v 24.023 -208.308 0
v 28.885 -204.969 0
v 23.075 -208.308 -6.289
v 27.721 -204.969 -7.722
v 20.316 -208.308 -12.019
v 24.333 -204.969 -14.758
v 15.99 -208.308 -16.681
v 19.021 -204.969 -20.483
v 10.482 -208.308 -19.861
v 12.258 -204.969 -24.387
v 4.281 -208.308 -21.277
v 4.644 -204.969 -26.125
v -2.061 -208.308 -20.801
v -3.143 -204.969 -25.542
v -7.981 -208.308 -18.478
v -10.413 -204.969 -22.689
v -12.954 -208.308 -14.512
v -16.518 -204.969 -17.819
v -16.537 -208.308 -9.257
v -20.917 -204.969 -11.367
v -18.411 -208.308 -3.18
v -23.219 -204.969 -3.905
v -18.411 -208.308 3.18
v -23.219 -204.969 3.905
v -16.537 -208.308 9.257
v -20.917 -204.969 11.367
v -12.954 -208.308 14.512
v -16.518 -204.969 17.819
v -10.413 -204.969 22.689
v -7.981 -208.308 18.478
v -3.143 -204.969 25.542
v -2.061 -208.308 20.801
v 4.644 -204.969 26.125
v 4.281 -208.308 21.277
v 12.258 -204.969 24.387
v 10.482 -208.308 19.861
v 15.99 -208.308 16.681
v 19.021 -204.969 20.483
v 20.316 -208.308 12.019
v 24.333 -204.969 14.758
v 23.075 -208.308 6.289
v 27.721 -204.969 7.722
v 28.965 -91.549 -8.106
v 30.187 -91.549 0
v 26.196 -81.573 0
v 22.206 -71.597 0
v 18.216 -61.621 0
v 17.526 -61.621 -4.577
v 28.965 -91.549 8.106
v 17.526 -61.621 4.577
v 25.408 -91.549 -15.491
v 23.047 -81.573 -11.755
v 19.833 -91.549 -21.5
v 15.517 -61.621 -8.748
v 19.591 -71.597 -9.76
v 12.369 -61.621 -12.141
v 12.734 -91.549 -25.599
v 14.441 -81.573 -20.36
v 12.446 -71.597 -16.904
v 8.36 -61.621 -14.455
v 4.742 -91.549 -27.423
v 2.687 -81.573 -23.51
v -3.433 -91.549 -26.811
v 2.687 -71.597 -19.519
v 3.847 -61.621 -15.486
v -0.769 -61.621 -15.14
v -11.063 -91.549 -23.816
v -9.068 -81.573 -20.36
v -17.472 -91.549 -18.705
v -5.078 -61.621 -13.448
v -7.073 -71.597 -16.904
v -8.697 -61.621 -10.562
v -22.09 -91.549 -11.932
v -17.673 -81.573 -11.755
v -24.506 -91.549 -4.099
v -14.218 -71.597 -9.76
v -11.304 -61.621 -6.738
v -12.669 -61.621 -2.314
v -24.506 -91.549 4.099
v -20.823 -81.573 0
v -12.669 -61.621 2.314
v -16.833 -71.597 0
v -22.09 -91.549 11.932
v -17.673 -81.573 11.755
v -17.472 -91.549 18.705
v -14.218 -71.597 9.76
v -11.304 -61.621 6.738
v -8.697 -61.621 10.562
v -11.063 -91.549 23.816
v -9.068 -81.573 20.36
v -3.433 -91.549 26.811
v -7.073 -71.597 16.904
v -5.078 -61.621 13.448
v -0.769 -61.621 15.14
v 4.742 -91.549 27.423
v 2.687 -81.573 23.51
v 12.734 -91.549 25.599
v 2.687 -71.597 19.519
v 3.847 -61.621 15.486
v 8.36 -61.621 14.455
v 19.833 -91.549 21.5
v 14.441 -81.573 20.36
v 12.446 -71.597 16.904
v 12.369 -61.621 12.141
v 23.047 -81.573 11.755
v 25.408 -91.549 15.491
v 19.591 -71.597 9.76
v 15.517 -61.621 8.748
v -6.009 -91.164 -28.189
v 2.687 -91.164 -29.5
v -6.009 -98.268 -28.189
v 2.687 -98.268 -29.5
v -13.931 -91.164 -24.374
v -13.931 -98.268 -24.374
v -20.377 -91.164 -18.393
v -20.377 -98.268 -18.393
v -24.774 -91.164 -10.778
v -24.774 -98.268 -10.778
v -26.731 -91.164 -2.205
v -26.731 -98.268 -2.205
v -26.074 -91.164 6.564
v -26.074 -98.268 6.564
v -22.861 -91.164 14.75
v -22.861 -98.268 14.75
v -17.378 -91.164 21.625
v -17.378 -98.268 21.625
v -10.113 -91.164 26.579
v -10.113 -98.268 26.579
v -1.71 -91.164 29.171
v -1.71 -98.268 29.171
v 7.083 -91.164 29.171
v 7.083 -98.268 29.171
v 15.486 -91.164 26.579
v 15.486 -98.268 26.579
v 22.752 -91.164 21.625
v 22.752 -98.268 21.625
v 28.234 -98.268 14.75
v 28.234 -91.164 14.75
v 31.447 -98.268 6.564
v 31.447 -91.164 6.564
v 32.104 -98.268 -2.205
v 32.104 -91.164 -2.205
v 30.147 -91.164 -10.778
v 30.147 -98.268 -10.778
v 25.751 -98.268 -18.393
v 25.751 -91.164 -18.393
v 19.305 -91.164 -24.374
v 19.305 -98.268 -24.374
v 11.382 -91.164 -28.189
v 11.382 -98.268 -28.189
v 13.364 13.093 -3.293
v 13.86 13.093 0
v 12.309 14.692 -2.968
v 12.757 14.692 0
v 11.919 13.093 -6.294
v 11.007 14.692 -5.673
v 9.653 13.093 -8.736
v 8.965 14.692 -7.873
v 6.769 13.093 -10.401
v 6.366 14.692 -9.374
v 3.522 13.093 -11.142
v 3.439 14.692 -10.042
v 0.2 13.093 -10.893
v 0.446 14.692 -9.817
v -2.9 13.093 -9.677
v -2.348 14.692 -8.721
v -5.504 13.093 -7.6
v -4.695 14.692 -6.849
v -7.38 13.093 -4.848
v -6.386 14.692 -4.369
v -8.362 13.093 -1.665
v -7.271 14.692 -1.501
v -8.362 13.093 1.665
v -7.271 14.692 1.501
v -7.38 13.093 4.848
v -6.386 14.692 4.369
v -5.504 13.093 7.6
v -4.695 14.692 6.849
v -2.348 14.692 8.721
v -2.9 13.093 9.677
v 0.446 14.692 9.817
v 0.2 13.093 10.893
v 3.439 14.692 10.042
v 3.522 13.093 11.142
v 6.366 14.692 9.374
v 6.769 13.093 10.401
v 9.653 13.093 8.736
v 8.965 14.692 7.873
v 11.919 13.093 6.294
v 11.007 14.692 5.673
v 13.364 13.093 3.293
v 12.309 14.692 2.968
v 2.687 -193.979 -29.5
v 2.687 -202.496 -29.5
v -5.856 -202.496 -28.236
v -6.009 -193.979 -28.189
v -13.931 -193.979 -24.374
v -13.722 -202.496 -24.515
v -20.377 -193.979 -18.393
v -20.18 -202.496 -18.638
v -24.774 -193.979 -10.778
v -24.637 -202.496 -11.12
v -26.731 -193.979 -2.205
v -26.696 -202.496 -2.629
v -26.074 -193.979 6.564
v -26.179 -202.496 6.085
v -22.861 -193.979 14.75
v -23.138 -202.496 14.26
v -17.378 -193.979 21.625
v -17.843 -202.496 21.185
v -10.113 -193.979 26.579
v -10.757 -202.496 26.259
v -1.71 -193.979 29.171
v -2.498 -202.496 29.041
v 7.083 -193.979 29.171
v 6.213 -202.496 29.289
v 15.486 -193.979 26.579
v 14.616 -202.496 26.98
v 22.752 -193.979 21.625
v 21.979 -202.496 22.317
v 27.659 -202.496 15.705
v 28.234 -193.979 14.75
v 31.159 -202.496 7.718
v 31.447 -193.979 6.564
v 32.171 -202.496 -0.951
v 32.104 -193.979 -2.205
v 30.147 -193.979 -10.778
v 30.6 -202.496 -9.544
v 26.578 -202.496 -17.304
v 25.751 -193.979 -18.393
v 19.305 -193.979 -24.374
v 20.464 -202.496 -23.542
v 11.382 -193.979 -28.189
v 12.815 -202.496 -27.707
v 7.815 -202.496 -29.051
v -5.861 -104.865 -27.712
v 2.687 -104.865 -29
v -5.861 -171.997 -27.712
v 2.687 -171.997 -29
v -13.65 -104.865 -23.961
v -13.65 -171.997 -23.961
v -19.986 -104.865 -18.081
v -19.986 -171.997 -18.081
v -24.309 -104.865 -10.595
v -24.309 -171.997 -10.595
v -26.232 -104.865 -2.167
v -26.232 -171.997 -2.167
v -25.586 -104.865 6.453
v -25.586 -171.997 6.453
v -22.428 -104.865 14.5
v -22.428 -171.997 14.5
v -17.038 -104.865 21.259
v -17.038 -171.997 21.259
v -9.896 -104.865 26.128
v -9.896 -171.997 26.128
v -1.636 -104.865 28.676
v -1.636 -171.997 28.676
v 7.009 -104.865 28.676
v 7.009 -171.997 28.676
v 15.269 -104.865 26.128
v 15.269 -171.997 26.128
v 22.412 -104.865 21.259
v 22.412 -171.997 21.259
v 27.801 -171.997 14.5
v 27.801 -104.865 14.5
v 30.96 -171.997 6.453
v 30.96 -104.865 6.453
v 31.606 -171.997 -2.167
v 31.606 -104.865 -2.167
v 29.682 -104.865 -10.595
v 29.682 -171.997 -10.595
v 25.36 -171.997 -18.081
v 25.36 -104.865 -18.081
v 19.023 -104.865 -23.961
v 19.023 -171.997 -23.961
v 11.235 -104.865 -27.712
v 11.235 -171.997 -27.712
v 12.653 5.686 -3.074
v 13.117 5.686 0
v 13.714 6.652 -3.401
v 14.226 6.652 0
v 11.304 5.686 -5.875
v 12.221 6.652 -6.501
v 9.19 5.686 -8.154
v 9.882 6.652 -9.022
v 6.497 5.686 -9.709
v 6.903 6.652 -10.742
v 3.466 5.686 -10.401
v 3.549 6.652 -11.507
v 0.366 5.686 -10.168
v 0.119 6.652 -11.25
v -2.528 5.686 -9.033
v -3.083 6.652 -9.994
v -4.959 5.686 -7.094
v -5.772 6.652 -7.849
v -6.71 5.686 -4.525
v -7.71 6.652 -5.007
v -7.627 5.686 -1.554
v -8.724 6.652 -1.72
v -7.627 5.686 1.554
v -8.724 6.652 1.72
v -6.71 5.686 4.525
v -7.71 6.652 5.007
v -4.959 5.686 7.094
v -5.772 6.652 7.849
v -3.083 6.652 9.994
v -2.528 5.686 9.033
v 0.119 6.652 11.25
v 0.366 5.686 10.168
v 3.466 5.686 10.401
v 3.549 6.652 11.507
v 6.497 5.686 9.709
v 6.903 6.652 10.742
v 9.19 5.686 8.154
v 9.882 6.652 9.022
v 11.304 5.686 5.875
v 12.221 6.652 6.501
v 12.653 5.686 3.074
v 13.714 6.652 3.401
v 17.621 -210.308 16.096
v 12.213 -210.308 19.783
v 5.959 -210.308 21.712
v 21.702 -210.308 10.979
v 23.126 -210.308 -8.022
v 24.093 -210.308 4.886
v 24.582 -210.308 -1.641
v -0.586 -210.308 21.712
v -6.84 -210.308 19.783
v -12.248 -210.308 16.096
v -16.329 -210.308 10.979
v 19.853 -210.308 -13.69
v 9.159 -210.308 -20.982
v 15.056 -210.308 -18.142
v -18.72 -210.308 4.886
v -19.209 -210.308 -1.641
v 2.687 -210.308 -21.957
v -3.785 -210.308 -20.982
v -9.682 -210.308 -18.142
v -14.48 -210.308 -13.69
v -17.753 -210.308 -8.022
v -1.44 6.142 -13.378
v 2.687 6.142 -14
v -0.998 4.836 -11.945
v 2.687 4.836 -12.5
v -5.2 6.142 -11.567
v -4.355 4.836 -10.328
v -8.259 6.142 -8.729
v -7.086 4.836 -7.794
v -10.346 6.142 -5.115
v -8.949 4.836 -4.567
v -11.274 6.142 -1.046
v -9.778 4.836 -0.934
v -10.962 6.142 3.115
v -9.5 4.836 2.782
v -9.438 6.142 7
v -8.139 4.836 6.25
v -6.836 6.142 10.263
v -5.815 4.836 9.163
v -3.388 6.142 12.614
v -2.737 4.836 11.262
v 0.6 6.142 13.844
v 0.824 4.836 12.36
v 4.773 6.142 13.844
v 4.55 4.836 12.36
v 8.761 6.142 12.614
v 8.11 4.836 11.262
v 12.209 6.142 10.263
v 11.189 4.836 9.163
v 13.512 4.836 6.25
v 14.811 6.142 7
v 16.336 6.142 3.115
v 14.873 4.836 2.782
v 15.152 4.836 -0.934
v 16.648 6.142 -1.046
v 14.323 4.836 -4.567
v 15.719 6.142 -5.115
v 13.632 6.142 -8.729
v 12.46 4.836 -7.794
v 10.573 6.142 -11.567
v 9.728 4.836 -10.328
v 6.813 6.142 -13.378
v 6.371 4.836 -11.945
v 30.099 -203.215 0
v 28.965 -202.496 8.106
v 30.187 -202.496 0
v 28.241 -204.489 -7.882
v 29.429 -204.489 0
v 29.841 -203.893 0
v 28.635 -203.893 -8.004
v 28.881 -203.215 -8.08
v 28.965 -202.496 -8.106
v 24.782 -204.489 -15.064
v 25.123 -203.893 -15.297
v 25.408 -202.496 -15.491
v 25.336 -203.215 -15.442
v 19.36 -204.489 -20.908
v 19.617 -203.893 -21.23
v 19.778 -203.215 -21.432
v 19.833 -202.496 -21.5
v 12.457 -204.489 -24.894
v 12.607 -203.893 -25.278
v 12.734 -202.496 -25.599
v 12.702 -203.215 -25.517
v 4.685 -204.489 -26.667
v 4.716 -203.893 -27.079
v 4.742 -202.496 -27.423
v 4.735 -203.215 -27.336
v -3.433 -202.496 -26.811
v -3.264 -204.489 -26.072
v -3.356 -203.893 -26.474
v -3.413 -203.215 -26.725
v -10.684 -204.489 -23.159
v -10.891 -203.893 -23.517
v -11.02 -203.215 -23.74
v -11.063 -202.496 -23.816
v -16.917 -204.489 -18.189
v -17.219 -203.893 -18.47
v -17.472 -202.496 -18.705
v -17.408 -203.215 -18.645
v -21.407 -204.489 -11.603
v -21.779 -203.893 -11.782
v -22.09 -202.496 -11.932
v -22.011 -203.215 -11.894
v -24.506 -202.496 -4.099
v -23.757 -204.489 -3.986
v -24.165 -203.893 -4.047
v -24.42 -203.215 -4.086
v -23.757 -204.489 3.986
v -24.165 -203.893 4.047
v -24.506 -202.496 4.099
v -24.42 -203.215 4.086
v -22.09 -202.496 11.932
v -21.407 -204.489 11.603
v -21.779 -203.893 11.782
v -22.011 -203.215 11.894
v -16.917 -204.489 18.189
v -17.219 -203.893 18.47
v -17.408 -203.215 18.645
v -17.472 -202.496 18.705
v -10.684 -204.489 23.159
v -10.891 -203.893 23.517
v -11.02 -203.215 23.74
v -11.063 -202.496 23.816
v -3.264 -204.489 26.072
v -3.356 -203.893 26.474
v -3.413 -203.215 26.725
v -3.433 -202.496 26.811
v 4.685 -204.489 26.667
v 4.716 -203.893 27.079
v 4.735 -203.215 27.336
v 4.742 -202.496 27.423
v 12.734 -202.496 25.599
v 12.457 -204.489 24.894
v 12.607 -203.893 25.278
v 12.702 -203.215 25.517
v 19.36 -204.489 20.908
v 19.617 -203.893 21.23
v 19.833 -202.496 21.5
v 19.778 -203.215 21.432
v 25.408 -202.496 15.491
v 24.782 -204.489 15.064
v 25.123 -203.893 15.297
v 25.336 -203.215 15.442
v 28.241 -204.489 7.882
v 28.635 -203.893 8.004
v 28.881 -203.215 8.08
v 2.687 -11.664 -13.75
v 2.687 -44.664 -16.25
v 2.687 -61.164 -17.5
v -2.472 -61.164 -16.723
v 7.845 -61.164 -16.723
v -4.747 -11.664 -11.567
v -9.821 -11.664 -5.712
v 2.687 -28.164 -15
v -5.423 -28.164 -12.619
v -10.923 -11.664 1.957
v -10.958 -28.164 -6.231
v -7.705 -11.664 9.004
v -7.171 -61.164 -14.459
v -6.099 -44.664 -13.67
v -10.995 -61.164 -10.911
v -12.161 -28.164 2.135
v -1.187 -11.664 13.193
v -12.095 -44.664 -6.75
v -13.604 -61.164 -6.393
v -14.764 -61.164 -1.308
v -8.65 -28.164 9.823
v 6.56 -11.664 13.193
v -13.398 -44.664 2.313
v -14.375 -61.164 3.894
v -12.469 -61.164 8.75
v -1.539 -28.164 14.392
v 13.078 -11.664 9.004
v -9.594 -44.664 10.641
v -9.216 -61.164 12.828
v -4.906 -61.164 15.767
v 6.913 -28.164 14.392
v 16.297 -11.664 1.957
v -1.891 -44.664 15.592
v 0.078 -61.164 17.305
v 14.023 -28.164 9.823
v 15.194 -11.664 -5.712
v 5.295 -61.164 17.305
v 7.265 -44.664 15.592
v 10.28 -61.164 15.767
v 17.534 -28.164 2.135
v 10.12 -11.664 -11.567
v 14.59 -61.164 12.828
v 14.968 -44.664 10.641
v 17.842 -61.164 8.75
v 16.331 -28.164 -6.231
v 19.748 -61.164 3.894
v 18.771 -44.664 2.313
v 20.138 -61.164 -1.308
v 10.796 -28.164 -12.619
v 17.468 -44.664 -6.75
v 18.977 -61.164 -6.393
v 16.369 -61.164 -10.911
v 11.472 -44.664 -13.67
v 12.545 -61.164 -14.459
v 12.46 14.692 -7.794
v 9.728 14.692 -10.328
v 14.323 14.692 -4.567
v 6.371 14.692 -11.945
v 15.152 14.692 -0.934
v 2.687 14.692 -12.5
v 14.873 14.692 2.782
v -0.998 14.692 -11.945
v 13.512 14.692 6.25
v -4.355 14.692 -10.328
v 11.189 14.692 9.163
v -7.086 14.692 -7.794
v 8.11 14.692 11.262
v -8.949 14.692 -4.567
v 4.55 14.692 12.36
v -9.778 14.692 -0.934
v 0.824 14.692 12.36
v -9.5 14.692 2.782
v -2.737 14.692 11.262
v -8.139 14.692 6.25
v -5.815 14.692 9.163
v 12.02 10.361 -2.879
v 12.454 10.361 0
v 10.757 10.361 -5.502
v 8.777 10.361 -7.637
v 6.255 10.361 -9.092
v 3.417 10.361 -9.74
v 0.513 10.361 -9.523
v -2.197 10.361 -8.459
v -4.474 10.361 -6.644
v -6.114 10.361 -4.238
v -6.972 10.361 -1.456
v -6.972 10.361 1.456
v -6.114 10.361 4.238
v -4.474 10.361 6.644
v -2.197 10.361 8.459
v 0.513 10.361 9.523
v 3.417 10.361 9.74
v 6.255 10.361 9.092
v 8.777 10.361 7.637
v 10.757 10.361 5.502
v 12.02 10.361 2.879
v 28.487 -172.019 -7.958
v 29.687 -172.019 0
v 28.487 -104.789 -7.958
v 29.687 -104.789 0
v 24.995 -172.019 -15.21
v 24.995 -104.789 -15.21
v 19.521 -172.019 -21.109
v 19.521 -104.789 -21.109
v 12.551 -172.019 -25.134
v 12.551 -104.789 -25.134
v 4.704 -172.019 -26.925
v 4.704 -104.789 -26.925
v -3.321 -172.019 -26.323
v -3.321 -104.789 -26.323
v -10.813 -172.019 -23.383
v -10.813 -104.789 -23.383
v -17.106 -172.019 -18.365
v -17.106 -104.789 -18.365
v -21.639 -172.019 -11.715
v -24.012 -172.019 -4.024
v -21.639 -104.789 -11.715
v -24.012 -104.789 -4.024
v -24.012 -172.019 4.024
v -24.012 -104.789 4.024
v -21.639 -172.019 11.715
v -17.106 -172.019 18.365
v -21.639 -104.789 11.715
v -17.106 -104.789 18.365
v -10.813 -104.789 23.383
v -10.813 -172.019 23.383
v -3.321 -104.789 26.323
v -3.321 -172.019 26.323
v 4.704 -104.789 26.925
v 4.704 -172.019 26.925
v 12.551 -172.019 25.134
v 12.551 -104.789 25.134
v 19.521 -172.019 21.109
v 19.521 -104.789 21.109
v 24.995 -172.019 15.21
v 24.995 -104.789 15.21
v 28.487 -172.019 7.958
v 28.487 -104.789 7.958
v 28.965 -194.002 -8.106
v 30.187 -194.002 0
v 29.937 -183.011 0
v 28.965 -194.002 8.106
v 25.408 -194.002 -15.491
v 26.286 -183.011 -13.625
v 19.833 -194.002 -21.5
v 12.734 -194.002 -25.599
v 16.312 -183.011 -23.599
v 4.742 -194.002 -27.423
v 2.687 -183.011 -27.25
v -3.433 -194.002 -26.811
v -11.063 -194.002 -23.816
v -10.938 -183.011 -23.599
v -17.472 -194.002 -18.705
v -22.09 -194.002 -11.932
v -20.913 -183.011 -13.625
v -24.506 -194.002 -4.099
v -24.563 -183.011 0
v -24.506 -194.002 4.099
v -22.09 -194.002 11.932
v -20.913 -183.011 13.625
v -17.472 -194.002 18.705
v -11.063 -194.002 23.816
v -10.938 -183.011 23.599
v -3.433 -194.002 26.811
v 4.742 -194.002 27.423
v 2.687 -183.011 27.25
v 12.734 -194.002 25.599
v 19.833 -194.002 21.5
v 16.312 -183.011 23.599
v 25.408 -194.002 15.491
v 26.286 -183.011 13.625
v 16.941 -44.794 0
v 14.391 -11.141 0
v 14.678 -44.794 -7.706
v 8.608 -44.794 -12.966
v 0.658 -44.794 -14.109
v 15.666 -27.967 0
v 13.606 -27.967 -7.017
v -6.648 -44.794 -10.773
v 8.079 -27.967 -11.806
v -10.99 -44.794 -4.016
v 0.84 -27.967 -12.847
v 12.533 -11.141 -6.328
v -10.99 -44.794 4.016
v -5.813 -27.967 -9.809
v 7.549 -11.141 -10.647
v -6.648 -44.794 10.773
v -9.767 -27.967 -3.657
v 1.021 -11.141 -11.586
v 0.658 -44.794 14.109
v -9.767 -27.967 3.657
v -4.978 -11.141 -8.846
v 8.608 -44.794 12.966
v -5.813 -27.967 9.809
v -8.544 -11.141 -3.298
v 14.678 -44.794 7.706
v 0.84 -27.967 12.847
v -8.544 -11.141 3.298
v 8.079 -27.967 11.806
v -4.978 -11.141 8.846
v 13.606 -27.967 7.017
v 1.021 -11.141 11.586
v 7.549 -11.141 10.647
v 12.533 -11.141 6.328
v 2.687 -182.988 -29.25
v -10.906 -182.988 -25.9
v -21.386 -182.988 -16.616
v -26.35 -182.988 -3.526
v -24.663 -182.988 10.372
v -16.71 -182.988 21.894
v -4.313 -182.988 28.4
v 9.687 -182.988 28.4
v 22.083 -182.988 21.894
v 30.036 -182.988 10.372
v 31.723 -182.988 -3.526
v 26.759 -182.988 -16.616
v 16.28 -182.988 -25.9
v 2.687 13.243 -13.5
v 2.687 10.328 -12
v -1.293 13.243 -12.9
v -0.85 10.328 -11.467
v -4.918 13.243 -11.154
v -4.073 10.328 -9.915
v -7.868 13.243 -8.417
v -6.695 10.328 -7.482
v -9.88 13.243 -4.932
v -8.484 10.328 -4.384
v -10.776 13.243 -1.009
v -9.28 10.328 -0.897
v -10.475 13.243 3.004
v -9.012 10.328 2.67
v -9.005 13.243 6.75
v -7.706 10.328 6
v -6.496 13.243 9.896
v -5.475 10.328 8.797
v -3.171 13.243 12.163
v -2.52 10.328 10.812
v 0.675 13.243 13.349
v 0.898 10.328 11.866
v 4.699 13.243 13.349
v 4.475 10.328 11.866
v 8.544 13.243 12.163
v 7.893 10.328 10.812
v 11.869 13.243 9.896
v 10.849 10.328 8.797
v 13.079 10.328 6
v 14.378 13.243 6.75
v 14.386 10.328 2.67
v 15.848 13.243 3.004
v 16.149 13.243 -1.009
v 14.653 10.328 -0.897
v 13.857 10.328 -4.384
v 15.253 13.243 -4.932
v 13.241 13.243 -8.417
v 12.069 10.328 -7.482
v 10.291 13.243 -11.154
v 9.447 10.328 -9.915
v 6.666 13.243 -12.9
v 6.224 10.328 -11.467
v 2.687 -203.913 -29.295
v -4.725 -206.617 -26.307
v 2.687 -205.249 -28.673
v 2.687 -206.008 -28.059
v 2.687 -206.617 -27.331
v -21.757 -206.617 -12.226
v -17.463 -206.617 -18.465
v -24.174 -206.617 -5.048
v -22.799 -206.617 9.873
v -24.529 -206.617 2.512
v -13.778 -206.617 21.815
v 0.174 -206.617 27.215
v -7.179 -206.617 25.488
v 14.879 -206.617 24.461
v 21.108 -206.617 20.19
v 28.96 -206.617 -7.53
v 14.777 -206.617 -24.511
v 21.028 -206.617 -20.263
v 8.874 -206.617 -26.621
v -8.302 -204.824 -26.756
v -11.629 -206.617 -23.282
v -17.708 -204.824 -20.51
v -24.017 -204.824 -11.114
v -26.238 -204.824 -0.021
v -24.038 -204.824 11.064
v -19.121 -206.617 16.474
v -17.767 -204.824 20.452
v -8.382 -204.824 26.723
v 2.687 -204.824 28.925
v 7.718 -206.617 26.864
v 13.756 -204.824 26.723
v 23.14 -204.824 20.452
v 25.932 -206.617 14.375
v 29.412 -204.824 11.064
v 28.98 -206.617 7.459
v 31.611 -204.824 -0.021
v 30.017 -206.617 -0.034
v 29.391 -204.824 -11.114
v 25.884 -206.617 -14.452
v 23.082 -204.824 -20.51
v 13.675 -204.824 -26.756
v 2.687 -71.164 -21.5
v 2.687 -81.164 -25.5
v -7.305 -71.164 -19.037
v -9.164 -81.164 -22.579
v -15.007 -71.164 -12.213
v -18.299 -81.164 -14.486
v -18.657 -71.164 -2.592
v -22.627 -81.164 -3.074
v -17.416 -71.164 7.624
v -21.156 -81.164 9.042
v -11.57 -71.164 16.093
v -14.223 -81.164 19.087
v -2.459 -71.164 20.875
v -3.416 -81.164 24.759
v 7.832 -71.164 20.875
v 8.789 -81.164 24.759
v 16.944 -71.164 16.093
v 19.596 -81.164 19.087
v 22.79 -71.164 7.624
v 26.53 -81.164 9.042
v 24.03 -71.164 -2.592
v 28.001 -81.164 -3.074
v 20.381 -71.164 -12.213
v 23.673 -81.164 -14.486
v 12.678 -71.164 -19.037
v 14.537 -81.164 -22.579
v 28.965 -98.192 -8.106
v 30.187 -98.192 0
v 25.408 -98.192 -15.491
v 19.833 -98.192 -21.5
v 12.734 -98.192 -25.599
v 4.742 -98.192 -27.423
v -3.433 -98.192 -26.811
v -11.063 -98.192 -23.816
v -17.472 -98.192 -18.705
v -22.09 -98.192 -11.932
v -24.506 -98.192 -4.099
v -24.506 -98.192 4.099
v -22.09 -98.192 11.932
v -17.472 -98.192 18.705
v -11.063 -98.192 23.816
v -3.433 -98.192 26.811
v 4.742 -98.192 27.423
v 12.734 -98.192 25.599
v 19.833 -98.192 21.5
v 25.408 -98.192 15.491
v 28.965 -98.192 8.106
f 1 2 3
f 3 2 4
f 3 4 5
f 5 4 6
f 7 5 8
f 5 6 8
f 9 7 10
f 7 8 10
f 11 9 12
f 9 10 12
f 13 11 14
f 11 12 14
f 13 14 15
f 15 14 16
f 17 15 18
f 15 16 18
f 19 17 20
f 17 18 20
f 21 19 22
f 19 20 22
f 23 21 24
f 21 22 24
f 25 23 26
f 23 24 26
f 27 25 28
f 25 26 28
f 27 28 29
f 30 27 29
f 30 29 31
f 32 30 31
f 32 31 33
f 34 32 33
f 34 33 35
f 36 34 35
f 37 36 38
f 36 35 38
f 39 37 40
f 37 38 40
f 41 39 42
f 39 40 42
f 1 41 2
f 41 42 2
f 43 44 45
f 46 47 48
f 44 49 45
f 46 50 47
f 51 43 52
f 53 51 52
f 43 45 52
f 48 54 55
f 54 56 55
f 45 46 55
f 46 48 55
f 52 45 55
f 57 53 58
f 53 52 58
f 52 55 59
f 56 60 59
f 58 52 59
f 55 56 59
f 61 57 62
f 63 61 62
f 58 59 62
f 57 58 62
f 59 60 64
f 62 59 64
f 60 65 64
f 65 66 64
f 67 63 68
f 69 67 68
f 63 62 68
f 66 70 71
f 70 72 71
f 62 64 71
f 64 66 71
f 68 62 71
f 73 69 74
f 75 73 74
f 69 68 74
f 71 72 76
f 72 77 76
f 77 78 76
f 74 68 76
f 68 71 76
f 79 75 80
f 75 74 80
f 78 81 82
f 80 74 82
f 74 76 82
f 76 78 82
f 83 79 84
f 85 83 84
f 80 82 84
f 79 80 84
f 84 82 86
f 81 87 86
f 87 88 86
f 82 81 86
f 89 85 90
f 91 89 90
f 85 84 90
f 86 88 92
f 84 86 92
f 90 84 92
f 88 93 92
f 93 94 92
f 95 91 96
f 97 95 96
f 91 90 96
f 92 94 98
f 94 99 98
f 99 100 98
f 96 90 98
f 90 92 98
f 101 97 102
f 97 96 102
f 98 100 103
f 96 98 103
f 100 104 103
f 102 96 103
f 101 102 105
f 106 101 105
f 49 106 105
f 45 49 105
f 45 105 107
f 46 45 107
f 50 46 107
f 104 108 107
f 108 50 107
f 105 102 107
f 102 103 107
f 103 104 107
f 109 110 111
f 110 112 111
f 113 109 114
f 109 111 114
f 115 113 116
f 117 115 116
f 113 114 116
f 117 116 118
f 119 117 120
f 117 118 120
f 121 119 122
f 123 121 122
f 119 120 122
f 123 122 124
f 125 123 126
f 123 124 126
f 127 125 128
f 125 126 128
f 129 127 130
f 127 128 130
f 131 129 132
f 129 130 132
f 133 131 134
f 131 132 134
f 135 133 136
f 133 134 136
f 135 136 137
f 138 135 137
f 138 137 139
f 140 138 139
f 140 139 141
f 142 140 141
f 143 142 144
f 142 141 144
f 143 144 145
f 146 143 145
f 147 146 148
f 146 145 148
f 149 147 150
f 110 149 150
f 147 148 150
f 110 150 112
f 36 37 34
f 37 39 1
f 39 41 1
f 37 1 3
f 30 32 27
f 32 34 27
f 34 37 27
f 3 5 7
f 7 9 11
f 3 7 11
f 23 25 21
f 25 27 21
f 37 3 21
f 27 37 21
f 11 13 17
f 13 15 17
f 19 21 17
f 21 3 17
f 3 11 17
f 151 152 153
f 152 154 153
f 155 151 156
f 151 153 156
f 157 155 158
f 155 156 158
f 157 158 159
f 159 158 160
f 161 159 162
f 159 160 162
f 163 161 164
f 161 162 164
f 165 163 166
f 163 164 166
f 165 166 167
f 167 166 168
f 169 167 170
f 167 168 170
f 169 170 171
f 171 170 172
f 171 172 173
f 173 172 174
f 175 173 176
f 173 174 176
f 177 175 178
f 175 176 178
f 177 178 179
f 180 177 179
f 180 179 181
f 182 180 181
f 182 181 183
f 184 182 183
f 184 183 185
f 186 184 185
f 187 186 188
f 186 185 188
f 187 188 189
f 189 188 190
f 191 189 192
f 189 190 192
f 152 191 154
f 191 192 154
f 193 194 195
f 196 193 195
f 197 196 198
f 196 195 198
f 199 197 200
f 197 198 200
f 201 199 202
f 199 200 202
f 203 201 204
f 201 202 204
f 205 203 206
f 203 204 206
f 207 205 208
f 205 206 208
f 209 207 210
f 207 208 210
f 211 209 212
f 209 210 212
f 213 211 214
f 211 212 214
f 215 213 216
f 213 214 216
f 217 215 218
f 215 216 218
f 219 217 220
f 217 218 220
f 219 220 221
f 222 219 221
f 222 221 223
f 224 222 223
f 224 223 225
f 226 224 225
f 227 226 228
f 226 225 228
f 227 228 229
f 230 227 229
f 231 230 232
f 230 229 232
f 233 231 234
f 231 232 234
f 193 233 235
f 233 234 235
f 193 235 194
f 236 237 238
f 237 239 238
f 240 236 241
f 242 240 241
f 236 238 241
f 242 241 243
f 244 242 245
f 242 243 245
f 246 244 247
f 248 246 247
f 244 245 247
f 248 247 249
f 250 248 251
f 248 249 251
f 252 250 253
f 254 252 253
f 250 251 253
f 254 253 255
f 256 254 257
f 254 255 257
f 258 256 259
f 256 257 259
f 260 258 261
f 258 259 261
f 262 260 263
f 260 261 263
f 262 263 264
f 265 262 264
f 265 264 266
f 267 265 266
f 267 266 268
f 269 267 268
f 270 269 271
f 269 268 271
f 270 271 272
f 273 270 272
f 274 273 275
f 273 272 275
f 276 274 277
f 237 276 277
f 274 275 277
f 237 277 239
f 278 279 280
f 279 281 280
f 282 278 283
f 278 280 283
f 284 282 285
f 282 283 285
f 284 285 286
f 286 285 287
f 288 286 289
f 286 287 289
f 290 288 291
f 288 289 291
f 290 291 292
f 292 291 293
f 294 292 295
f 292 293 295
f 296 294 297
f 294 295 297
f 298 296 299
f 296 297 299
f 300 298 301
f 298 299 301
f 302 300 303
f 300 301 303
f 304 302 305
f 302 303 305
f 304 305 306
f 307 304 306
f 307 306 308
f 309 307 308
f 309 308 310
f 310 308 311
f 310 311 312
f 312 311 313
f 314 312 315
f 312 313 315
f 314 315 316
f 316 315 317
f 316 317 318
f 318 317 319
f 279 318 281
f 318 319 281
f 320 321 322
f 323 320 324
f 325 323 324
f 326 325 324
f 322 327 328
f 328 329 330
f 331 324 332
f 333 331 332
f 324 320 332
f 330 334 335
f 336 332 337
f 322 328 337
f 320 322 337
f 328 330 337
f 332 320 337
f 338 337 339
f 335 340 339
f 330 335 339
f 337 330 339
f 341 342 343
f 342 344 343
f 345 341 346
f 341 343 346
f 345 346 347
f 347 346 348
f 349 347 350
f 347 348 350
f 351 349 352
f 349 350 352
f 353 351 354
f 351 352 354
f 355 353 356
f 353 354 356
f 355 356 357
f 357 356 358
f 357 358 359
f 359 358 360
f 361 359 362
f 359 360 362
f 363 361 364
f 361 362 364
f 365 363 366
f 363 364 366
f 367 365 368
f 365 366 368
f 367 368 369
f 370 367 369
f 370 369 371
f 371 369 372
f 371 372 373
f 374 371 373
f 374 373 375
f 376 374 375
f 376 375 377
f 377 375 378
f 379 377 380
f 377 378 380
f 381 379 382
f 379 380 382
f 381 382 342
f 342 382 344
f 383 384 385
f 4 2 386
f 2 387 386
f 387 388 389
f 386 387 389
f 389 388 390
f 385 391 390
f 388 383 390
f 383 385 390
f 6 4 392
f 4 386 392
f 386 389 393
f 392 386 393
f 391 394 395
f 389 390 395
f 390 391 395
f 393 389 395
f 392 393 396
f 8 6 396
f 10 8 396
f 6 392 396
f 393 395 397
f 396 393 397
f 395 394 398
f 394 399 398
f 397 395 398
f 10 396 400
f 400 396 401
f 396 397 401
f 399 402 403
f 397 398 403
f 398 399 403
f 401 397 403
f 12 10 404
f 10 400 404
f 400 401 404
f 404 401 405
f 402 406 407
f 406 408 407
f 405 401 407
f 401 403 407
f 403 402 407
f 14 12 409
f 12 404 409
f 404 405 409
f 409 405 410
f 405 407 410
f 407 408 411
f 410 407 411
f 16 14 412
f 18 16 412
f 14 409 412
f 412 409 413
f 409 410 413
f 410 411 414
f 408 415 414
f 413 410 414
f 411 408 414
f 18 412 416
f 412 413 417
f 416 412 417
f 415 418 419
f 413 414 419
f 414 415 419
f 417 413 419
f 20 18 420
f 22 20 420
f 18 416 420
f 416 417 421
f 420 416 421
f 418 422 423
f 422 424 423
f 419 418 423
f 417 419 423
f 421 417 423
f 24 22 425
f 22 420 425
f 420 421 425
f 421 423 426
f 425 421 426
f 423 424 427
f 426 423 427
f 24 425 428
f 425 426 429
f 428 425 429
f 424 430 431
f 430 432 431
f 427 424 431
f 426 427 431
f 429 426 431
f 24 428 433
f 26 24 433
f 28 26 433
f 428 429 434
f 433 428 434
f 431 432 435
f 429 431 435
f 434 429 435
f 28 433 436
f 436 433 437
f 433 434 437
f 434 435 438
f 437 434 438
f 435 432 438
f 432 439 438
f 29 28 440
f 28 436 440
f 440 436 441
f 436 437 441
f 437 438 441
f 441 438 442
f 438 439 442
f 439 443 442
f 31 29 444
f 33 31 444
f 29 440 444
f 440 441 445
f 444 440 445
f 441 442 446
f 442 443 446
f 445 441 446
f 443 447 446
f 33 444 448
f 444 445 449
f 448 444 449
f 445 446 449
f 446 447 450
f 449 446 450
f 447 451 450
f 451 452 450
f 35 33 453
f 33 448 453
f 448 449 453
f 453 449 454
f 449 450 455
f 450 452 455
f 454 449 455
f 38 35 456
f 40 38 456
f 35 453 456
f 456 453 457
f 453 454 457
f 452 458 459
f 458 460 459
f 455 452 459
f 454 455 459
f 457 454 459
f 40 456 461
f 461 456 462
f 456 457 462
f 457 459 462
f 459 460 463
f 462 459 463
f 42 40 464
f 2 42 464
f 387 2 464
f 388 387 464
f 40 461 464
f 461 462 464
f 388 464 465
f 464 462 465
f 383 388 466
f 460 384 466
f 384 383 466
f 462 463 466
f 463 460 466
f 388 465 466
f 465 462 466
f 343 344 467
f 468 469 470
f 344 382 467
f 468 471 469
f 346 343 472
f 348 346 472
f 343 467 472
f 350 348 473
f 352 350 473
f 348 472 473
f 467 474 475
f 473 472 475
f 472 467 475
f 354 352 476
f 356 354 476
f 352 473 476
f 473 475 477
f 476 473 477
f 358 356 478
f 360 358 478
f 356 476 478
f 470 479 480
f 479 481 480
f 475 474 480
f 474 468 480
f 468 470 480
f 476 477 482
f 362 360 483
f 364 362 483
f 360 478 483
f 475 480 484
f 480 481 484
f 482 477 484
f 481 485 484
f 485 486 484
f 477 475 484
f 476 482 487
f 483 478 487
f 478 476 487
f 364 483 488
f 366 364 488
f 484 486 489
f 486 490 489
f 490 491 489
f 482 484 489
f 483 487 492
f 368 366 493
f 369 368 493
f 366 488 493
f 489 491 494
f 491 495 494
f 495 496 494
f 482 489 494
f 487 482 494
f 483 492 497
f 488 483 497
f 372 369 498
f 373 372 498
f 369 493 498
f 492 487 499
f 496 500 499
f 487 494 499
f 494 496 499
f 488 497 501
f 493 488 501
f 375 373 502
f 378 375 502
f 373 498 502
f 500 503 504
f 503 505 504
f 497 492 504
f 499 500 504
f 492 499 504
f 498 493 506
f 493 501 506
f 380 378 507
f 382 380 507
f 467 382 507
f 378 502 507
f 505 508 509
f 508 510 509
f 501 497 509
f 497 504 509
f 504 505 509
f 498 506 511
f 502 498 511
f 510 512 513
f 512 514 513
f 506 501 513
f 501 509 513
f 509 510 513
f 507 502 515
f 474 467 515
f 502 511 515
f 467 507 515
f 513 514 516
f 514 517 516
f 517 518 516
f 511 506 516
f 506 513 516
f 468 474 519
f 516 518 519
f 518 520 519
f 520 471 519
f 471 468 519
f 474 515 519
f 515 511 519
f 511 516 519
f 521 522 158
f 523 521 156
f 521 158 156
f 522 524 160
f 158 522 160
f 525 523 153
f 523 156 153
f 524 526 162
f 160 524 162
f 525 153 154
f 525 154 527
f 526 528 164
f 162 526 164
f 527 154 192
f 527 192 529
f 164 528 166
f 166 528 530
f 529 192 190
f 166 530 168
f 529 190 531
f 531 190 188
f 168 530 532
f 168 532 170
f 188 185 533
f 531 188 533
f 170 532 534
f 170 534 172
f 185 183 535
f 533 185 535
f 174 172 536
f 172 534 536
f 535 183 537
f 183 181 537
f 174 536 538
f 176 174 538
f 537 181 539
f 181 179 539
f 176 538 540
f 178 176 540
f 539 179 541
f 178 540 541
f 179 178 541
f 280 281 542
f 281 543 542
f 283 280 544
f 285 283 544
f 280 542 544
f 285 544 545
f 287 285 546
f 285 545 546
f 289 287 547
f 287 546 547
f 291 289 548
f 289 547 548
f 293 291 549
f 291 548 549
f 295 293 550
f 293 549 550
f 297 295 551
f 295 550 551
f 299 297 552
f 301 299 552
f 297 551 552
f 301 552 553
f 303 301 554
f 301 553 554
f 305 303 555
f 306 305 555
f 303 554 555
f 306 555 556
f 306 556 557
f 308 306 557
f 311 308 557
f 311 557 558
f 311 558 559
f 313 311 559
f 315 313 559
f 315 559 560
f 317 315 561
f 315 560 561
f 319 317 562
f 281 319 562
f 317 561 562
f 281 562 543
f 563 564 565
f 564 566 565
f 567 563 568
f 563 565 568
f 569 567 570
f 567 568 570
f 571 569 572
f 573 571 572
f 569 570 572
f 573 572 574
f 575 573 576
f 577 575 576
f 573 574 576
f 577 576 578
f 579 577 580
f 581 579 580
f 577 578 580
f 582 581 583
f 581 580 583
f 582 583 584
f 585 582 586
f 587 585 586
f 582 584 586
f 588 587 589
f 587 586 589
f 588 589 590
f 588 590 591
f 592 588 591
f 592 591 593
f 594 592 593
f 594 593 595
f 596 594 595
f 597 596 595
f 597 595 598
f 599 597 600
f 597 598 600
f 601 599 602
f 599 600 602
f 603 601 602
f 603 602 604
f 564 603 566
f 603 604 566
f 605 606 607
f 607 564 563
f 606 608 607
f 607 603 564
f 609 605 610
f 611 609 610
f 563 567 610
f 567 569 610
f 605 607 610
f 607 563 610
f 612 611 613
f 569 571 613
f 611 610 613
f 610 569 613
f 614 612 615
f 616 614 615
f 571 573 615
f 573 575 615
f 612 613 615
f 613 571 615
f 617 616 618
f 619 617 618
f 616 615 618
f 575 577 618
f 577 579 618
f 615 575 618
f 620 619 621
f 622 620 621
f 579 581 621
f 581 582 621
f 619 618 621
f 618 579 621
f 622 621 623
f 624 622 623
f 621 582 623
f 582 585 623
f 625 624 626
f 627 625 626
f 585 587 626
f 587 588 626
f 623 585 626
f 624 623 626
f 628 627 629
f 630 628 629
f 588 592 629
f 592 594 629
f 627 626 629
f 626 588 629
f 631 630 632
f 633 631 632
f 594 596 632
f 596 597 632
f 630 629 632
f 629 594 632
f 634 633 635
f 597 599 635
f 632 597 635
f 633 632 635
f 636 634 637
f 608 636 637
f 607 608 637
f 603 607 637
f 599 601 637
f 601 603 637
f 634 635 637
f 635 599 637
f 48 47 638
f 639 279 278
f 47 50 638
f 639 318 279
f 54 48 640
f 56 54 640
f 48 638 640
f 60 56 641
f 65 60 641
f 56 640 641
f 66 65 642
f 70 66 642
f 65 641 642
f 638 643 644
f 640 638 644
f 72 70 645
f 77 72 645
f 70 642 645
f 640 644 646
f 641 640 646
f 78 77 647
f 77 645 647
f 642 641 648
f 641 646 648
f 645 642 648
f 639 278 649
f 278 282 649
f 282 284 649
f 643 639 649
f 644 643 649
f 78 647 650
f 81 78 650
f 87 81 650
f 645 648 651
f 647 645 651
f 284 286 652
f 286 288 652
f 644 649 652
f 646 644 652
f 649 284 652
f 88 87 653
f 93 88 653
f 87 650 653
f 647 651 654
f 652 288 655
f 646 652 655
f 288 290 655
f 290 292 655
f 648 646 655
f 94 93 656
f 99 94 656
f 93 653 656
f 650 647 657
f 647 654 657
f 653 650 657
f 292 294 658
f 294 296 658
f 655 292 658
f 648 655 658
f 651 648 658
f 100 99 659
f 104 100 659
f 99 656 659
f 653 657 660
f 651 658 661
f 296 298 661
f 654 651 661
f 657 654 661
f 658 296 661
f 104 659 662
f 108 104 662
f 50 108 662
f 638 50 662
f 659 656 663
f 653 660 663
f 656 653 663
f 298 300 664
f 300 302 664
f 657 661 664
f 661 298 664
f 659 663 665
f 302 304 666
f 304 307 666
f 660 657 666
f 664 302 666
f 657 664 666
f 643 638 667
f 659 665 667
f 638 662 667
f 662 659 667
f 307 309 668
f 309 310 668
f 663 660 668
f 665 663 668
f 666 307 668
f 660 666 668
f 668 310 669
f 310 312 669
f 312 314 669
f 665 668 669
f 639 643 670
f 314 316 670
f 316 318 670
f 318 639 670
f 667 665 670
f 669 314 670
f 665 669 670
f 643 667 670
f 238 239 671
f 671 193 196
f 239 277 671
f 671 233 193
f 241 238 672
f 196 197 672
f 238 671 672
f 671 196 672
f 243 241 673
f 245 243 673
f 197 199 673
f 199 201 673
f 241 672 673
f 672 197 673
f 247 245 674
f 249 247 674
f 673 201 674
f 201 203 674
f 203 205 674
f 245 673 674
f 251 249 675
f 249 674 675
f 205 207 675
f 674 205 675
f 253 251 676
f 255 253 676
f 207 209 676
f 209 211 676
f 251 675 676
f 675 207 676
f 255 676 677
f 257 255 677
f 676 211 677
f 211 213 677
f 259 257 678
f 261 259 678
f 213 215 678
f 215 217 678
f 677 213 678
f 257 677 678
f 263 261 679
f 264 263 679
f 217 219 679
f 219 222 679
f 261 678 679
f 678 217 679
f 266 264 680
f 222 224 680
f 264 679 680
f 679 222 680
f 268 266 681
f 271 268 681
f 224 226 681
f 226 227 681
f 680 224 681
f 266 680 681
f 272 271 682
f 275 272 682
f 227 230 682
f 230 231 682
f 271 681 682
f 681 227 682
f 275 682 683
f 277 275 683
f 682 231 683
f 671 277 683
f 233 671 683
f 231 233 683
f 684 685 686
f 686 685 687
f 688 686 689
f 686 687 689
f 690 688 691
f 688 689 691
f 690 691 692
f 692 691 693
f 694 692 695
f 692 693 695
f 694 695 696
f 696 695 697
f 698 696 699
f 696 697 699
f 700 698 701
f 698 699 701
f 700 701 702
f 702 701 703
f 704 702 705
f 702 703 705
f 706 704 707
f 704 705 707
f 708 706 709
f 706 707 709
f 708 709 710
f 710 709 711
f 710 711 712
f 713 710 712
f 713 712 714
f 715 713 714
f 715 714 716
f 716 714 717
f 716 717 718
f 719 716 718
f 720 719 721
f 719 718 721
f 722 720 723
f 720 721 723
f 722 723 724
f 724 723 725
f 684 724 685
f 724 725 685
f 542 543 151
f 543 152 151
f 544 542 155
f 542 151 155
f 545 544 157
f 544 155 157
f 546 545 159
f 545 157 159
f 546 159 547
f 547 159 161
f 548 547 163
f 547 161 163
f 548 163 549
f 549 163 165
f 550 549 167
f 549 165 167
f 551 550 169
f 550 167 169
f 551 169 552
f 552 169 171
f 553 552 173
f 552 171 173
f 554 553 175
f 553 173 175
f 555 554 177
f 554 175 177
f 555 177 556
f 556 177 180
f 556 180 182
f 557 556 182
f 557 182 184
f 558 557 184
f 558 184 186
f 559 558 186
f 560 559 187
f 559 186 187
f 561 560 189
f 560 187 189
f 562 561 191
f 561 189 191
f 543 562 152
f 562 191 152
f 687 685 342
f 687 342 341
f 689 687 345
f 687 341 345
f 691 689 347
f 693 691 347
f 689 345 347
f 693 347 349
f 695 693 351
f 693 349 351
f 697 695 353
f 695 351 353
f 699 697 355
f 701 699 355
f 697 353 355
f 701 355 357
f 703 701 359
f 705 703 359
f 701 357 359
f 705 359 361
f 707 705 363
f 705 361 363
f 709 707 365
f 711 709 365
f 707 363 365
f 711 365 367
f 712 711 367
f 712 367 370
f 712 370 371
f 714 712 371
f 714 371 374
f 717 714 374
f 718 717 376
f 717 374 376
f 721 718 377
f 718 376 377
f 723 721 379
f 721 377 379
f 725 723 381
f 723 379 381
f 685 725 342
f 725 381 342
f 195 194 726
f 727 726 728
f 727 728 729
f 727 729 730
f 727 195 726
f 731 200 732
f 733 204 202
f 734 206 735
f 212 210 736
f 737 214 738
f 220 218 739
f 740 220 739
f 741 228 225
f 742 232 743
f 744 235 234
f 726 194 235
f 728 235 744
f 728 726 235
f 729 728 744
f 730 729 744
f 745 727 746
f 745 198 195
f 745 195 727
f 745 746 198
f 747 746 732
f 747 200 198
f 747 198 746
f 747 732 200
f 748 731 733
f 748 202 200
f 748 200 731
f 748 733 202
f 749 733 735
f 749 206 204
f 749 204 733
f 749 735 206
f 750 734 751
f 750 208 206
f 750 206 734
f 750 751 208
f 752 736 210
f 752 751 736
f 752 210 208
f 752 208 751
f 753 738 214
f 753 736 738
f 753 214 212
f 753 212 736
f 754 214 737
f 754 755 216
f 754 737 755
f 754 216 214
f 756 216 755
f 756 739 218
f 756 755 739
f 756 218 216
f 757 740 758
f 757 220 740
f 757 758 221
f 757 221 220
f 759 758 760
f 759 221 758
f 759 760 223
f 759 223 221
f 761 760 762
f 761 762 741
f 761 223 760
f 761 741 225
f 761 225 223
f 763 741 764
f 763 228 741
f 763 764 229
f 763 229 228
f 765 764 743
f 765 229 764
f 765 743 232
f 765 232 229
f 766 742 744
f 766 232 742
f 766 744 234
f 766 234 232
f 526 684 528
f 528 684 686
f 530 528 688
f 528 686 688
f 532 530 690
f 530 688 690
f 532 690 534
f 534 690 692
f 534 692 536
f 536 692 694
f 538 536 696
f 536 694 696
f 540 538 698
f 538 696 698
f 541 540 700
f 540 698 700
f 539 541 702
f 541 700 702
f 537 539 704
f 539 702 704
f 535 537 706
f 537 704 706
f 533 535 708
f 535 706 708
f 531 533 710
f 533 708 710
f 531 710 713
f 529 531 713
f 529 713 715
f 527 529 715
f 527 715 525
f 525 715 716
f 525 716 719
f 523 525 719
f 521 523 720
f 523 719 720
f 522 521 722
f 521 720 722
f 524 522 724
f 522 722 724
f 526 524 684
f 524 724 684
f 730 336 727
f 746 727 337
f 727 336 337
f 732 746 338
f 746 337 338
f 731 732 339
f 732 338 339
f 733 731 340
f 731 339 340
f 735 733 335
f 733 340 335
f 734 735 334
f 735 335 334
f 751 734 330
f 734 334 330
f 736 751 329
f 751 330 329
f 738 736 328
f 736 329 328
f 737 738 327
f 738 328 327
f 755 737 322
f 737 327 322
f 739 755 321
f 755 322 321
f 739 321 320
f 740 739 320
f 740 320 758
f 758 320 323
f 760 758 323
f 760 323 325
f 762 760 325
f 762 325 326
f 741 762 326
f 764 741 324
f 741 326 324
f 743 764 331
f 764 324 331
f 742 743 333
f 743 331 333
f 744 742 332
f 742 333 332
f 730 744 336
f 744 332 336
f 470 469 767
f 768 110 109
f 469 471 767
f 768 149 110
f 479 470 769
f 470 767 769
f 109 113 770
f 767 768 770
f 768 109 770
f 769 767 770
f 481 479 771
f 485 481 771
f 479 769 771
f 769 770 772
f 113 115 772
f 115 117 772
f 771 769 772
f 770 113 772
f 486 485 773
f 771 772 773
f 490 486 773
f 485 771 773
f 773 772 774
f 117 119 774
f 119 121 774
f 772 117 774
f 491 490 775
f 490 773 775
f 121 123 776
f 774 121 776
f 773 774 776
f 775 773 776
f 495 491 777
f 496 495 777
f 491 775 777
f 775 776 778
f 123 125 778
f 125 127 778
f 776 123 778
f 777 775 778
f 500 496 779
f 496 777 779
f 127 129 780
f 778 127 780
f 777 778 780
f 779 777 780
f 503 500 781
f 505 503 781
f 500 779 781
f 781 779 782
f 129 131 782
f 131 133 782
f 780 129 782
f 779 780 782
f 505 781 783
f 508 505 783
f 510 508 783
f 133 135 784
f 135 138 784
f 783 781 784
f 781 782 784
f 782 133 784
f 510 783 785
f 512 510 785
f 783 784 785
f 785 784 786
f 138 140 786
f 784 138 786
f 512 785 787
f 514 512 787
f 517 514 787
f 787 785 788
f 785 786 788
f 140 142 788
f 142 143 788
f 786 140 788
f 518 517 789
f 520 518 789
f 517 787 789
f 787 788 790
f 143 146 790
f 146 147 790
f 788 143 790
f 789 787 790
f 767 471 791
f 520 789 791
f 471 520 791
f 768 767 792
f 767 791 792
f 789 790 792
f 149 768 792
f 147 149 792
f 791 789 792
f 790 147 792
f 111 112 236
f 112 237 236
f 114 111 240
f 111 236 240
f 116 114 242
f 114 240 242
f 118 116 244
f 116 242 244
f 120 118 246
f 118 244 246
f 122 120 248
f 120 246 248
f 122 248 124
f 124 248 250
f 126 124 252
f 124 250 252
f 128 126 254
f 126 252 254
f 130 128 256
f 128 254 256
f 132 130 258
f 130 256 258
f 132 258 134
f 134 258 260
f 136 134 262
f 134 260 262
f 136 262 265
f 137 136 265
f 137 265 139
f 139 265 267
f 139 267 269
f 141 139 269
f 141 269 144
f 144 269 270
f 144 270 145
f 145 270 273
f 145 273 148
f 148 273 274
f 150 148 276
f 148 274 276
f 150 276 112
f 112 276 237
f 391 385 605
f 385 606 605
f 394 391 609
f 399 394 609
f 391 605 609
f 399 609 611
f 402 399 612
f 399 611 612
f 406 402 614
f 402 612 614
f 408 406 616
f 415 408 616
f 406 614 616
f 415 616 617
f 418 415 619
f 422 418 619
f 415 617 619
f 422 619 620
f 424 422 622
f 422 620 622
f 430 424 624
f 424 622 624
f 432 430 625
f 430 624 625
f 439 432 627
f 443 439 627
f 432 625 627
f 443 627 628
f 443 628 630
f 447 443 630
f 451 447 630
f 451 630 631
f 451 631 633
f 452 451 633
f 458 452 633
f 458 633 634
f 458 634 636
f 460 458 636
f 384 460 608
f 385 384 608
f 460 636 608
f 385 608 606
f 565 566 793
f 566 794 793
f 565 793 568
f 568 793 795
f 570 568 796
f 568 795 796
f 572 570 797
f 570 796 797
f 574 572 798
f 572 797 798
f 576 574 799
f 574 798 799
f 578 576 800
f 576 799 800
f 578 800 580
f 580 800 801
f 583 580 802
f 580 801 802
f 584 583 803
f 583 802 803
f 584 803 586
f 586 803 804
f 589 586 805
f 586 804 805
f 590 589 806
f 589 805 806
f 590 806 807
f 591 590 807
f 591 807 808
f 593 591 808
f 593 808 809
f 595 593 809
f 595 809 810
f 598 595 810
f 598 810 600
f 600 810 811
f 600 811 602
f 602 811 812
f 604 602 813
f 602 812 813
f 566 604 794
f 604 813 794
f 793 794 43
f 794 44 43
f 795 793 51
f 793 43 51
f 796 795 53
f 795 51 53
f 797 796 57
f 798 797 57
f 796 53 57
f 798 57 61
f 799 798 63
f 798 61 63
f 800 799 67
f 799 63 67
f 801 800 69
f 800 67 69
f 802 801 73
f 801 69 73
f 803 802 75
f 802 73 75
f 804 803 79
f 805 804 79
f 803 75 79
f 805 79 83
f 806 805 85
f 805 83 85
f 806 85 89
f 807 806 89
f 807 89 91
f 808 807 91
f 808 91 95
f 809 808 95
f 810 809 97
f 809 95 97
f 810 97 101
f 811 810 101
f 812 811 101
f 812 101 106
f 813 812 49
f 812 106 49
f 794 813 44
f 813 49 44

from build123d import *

# Parameters (mm, degrees)
FILLET2_R = 5


# Read off the part's stored shape, not the designer's step: Shell2
with BuildPart() as part:
    # Sketch1 → Revolve1 (revolve)
    with BuildSketch(Plane.XY, mode=Mode.PRIVATE) as revolve1_sk:
        Polygon((2.686675584, 14.691802026), (15.186675584, 14.691802026), (16.186675584, 13.242778256), (14.686675584, 10.327805917), (16.686675584, 6.141812908), (15.186675584, 4.836496853), (20.186675584, -61.163503147), (32.186675584, -91.163503147), (32.186675584, -98.267944917), (31.686675584, -104.864926562), (31.686675584, -171.996704513), (32.186675584, -193.979014243), (32.186675584, -205.127326289), (24.643709458, -210.308197974), (2.686675584, -210.308197974), align=None)
    revolve(revolve1_sk.sketch.rotate(Axis((2.686675584, -210.308197974, 0), (0, 1, 0)), 90), axis=Axis((2.686675584, -210.308197974, 0), (0, 1, 0)))

    # Fillet2
    fillet2_edges = [part.edges().sort_by_distance(p)[0] for p in [
        (2.686675584, -205.127326289, 29.5),
    ]]
    fillet(fillet2_edges, radius=FILLET2_R)

    # Shell2 outline → Shell2 (revolve, cut)
    with BuildSketch(Plane(origin=(2.686675584, 0, 0), x_dir=(1, 0, 0), z_dir=(0, 0, 1))):
        with BuildLine():
            Line((9.76769763, 10.360768085), (11.173521052, 13.092725677))
            Line((11.173521052, 13.092725677), (10.069966795, 14.691802026))
            Line((10.069966795, 14.691802026), (0, 14.691802026))
            Line((0, 14.691802026), (0, -208.308197974))
            Line((0, -208.308197974), (21.336339779, -208.308197974))
            Line((21.336339779, -208.308197974), (26.198491575, -204.968638423))
            ThreePointArc((26.198491575, -204.968638423), (27.154757496, -203.892994192), (27.5, -202.495760268))
            Line((27.5, -202.495760268), (27.5, -194.001756864))
            Line((27.5, -194.001756864), (27, -172.019447135))
            Line((27, -172.019447135), (27, -104.789242859))
            Line((27, -104.789242859), (27.5, -98.192261215))
            Line((27.5, -98.192261215), (27.5, -91.548667954))
            Line((27.5, -91.548667954), (15.528926693, -61.620984687))
            Line((15.528926693, -61.620984687), (10.429889715, 5.686303432))
            Line((10.429889715, 5.686303432), (11.539666623, 6.652043176))
            Line((11.539666623, 6.652043176), (9.76769763, 10.360768085))
        make_face()
    revolve(axis=Axis((2.686675584, 0, 0), (0, 1, 0)), mode=Mode.SUBTRACT)


solid = part.part
